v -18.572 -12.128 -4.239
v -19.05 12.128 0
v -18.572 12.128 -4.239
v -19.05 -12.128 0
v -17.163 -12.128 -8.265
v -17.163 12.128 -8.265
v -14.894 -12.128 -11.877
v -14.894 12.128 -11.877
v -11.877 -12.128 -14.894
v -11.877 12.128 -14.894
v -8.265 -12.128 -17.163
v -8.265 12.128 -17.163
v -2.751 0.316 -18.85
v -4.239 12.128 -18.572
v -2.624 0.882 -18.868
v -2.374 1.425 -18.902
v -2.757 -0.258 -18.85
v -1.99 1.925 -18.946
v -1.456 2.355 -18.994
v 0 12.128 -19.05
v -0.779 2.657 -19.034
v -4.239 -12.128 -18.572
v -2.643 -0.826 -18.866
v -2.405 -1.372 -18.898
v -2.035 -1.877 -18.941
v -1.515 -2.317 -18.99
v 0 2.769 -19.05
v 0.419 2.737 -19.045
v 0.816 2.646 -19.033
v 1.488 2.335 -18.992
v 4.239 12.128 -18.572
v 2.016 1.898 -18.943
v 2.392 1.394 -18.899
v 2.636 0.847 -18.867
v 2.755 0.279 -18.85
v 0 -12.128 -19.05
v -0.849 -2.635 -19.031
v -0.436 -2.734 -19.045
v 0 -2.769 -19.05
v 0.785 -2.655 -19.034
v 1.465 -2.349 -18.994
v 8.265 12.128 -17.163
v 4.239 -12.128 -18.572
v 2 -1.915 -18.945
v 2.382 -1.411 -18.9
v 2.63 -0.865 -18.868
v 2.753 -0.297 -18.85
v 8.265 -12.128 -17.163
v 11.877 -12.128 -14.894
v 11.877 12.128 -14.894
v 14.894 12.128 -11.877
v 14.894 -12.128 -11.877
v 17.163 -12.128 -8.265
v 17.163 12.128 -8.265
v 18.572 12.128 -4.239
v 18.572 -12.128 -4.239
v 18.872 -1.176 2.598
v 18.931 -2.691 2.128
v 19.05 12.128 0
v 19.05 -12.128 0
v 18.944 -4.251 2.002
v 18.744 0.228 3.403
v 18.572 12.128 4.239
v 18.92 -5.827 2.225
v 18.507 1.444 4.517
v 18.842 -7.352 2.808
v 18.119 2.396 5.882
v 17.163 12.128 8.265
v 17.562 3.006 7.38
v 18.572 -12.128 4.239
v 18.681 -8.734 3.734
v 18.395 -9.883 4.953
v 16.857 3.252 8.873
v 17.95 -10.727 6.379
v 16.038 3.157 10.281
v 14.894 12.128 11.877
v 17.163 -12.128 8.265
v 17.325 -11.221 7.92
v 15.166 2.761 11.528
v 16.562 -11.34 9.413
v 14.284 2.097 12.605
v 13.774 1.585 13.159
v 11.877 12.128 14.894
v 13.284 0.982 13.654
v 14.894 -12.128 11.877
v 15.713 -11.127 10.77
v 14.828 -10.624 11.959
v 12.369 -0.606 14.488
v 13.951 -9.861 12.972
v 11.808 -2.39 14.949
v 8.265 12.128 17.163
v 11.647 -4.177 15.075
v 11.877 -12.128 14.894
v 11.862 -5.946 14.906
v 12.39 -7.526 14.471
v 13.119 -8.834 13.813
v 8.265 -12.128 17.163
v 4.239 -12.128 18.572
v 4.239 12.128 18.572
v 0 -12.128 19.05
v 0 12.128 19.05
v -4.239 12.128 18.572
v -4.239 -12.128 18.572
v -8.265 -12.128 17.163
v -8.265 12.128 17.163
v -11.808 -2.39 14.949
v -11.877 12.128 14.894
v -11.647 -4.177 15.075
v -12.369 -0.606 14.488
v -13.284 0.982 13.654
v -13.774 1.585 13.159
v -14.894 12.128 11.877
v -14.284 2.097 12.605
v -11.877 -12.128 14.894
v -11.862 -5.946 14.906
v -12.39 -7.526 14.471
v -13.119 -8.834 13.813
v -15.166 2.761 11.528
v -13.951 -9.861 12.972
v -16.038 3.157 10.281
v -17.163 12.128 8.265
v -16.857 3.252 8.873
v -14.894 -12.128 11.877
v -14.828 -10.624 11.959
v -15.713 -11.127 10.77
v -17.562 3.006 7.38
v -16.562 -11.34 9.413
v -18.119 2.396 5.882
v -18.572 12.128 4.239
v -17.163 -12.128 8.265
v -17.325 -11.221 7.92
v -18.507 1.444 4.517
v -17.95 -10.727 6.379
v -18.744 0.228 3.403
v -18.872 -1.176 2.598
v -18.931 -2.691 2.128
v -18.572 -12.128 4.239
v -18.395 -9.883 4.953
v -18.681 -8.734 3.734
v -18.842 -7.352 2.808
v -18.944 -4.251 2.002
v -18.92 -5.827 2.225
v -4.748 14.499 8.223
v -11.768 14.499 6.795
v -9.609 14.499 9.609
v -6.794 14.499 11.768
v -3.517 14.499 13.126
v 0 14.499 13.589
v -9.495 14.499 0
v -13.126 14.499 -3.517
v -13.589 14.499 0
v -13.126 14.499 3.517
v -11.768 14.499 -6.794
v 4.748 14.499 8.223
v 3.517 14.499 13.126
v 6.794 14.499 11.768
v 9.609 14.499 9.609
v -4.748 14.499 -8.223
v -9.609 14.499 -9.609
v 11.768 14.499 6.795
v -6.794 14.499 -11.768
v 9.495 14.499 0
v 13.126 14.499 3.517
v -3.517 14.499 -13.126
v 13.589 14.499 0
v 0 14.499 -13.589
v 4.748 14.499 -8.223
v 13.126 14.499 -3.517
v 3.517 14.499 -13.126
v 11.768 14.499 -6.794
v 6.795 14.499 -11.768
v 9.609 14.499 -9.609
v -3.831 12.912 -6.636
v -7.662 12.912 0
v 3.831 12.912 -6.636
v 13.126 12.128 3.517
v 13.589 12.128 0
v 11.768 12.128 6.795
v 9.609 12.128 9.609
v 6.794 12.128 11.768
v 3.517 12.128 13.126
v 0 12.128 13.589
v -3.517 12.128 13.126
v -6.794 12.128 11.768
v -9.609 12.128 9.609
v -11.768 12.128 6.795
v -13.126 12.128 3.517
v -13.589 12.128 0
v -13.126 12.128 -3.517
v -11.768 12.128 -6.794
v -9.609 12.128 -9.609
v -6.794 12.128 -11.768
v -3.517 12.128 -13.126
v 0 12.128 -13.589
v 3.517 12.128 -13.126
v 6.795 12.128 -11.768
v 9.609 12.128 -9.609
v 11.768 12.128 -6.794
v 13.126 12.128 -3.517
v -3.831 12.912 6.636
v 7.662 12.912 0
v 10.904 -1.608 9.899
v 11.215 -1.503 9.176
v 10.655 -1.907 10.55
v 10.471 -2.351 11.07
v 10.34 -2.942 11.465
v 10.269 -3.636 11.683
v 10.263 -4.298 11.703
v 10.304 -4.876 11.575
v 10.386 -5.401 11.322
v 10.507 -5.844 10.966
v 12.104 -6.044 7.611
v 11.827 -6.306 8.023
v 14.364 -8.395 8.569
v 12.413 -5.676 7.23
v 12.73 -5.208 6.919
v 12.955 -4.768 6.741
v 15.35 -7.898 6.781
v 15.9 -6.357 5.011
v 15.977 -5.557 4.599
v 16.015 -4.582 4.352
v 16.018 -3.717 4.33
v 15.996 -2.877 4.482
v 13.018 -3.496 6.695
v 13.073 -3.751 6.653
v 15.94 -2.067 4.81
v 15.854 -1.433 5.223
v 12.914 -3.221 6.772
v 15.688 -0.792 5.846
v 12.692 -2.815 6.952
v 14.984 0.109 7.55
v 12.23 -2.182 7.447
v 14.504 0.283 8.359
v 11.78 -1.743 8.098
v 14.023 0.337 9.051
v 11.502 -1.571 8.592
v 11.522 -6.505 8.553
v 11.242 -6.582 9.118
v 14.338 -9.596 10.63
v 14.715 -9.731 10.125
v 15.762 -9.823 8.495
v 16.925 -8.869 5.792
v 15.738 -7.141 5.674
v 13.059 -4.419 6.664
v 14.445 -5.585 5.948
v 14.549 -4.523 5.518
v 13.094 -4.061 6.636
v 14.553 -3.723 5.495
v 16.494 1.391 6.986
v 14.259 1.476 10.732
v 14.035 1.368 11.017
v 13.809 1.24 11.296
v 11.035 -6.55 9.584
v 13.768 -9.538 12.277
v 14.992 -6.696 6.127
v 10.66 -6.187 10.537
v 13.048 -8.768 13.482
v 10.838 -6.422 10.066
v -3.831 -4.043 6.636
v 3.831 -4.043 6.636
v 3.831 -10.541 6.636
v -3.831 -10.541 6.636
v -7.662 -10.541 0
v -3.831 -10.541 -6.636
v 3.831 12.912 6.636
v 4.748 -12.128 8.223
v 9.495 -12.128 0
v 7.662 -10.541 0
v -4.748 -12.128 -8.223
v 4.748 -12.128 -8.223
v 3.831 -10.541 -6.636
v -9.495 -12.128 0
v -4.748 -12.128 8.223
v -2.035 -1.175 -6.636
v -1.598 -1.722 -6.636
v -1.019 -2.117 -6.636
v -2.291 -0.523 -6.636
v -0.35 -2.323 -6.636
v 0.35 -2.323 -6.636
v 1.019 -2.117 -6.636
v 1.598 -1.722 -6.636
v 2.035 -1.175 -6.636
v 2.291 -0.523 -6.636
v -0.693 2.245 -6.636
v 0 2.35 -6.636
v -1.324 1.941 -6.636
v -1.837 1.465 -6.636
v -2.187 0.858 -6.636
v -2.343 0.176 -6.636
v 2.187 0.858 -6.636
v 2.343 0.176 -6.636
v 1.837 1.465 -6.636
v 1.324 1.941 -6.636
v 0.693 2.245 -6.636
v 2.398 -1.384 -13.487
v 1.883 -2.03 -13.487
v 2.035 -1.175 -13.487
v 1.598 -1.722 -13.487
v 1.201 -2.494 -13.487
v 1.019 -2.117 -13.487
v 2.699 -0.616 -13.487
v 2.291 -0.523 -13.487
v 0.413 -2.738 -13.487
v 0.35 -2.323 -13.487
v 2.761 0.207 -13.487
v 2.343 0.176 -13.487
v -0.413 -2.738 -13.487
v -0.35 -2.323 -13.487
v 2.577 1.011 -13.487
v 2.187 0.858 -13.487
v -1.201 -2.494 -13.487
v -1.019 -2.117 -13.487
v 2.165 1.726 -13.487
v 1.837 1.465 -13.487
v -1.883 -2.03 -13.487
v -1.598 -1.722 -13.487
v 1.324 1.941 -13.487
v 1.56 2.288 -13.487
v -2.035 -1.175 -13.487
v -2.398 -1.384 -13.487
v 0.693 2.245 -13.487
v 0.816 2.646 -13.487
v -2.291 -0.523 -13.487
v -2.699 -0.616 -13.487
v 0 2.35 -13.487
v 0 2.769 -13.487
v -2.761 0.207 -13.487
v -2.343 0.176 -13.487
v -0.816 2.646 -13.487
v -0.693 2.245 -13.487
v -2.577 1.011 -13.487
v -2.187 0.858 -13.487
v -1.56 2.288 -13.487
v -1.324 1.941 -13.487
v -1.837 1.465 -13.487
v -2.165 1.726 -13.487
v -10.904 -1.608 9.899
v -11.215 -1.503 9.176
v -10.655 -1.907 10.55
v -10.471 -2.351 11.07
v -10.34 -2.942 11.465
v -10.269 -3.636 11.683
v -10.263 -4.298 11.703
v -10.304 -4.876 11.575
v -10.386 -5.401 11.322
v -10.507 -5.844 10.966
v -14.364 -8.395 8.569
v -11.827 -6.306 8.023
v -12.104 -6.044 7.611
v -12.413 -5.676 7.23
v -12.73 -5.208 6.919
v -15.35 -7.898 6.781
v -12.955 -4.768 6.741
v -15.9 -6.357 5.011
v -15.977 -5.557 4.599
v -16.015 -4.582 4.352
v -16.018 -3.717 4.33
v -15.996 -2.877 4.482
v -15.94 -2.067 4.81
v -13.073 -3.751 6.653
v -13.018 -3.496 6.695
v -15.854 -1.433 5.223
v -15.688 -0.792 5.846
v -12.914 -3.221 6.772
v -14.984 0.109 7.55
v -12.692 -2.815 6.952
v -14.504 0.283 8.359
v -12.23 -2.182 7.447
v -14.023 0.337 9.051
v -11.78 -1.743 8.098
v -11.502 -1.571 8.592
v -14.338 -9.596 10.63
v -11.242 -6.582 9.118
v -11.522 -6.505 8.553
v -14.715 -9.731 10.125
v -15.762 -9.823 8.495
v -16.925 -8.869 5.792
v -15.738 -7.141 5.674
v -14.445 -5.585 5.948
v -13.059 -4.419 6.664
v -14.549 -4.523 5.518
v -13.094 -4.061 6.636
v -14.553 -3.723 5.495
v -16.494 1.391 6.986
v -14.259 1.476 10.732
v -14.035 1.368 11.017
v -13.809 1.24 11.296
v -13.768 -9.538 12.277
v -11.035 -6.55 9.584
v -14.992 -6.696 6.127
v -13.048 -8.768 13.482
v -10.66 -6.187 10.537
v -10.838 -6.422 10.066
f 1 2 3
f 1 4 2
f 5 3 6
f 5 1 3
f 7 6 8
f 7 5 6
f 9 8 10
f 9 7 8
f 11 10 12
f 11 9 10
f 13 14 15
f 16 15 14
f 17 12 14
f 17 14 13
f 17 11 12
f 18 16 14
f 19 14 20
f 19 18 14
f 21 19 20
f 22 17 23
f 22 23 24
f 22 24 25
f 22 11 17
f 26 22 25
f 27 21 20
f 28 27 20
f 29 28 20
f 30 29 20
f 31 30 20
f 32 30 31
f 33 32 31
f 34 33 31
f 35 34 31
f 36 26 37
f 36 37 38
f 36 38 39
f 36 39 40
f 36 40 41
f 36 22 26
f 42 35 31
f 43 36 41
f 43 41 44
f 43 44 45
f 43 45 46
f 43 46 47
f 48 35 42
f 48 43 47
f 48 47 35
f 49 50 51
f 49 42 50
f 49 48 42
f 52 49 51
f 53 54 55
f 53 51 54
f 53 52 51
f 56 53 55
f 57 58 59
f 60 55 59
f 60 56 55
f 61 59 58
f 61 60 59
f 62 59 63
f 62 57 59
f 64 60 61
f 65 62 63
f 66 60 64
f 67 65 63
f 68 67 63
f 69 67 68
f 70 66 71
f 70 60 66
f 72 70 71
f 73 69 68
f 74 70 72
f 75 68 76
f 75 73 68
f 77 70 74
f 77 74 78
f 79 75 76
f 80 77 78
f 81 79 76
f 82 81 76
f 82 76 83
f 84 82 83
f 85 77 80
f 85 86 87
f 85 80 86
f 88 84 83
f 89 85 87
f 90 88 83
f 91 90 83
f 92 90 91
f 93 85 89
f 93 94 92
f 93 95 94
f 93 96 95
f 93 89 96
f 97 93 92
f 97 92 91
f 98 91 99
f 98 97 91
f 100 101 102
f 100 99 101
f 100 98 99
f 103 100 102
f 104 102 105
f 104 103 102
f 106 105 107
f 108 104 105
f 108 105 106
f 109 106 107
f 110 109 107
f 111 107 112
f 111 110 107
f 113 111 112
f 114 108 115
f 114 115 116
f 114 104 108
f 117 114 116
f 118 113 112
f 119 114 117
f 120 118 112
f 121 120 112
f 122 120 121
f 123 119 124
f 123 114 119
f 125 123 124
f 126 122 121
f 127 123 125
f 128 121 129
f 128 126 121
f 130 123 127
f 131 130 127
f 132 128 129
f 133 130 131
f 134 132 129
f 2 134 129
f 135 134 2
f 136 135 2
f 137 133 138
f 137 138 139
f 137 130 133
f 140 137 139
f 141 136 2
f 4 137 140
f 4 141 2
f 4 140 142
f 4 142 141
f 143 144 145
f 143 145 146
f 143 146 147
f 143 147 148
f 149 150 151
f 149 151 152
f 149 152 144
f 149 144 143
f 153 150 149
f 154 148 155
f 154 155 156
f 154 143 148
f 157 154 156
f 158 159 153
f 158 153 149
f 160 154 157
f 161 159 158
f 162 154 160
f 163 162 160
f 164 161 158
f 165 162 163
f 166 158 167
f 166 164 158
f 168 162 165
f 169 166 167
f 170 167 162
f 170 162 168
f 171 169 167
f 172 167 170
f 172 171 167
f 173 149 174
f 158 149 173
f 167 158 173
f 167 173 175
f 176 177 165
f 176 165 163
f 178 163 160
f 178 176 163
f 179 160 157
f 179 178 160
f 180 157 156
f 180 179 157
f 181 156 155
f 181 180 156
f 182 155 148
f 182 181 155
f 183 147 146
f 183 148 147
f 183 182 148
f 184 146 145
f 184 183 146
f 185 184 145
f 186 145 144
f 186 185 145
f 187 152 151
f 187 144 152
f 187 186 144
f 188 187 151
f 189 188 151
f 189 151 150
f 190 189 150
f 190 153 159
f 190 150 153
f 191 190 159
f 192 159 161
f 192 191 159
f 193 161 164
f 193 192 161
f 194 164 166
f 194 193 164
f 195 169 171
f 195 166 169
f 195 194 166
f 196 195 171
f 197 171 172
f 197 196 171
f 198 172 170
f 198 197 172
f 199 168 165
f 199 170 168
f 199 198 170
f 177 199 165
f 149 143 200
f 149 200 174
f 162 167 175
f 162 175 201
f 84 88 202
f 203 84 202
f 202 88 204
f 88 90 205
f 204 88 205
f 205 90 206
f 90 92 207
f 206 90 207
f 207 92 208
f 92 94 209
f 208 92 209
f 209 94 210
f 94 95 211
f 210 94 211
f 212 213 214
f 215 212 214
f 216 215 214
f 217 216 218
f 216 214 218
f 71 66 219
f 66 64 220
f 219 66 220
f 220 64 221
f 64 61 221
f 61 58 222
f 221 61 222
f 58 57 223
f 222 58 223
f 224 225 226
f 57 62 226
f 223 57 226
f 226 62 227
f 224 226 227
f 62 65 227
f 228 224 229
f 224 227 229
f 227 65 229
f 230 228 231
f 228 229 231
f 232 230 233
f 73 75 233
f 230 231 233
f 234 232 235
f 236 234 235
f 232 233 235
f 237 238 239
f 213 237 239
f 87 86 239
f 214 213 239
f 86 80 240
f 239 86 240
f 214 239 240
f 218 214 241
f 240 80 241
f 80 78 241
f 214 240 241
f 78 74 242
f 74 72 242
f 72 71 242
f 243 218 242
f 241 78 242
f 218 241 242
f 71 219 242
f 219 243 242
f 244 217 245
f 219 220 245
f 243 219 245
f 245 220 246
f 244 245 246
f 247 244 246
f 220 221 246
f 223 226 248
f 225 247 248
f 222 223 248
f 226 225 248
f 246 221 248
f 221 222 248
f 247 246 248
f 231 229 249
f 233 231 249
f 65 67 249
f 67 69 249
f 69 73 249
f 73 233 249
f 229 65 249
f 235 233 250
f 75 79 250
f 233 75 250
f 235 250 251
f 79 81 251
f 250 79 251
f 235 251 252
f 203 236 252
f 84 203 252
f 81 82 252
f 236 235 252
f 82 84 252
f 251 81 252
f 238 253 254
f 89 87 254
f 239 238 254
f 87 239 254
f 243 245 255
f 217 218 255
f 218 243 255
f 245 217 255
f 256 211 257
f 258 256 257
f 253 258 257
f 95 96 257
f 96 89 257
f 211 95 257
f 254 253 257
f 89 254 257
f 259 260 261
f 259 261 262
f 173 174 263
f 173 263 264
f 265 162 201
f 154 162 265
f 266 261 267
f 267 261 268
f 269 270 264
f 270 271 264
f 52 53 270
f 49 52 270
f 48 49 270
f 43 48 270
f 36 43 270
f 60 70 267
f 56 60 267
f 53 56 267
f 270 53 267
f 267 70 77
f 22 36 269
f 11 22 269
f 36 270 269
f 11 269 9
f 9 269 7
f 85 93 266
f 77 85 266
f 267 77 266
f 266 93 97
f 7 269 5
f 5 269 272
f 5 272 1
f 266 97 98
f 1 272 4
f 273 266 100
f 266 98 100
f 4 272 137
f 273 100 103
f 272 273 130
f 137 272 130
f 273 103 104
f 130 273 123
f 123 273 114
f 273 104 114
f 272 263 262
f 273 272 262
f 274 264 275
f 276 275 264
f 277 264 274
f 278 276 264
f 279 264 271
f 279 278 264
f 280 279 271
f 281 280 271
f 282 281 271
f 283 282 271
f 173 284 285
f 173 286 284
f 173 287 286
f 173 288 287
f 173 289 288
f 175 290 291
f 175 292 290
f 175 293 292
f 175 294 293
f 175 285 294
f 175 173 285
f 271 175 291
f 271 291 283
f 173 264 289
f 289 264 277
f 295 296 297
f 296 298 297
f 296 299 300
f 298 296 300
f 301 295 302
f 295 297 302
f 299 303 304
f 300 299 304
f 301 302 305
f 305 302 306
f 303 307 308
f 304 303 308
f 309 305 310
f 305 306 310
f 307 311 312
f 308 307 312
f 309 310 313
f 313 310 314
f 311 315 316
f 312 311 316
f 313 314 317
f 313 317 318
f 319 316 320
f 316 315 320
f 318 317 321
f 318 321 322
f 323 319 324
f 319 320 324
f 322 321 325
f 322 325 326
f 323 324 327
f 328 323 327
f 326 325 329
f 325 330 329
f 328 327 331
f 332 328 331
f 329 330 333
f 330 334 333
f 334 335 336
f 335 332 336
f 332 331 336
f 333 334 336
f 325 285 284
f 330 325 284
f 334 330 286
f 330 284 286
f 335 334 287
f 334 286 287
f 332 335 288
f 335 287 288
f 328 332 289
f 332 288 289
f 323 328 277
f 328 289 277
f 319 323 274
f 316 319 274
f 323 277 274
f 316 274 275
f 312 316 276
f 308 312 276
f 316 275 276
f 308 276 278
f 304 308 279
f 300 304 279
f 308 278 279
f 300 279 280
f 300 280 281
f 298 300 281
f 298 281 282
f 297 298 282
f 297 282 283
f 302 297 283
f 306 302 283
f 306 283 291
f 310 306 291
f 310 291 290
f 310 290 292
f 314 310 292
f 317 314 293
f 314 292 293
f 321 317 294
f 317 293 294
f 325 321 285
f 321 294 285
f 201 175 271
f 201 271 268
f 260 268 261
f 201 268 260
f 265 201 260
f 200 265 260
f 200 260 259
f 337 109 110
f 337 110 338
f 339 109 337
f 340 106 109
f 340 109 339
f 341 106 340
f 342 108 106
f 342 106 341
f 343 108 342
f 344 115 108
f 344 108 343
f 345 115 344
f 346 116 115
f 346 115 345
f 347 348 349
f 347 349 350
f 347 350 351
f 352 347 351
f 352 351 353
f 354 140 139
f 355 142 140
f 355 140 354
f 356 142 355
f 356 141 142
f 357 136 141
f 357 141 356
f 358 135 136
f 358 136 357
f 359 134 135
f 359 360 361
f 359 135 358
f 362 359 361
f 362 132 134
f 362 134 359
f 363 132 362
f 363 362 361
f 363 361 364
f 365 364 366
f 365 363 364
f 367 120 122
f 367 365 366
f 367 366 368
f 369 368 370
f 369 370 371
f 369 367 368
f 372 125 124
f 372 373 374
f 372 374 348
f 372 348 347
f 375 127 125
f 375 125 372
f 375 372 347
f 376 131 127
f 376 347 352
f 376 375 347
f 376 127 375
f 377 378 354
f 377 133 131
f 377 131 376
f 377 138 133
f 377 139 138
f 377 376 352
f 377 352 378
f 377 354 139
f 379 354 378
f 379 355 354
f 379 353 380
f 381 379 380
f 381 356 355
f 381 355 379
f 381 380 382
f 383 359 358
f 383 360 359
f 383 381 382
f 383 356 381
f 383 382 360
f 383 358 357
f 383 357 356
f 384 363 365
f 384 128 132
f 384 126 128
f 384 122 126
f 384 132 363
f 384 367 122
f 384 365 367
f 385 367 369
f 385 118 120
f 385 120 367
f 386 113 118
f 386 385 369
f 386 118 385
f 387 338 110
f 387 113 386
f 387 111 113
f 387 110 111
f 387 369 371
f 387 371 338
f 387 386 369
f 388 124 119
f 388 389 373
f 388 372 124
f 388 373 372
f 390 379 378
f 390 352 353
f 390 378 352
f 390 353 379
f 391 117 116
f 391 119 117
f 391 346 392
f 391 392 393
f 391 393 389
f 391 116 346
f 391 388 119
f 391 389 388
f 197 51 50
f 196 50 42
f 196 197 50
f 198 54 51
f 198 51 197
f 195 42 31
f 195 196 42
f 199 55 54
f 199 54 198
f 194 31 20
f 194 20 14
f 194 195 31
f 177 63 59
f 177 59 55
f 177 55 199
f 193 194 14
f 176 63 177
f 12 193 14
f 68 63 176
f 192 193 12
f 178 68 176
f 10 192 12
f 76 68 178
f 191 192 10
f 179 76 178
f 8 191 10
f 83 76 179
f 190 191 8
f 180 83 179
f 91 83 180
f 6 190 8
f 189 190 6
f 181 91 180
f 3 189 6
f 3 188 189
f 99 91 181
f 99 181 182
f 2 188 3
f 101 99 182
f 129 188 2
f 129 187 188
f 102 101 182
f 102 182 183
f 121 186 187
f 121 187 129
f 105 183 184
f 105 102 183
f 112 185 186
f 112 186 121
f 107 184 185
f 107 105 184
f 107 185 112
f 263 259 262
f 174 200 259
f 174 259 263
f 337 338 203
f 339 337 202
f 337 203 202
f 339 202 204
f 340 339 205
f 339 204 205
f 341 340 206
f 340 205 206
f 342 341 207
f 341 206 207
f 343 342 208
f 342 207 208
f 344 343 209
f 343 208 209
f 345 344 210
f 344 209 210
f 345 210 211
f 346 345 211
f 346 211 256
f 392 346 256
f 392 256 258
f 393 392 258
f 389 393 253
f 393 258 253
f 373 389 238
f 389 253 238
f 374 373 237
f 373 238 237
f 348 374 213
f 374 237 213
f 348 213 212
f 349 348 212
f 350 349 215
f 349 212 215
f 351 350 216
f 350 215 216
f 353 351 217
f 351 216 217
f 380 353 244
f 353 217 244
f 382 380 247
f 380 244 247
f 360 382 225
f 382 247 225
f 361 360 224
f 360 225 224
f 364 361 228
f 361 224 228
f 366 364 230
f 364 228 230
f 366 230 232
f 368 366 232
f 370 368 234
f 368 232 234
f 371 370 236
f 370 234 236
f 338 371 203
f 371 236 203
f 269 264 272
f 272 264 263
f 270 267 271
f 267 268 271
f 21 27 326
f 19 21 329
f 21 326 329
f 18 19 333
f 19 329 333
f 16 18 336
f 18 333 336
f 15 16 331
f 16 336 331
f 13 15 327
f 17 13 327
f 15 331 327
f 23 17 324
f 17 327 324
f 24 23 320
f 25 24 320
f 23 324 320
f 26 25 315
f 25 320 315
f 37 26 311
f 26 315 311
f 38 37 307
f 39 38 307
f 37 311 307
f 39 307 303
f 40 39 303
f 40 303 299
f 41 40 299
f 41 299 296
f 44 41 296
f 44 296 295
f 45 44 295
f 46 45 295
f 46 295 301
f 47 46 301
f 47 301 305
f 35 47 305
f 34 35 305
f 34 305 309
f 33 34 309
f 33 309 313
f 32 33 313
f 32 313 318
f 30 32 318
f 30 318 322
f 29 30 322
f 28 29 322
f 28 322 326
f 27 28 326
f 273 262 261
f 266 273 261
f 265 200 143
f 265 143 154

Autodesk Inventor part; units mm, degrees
ref_plane "YZ Plane" through (0, 0, 0) normal (1, 0, 0) x (0, 1, 0)
ref_plane "XZ Plane" through (0, 0, 0) normal (0, 1, 0) x (-1, 0, 0)
sketch "Sketch9" plane through (0, 0, 0) normal (0, 1, 0) x (-1, 0, 0)
  circle A0 centre (0, 0) radius 19.05
  dimension "d53" = 38.1
extrude "Extrusion6" add sketch "Sketch9" along normal mid plane 24.257
sketch "Sketch10" plane through (0, 12.1285, 0) normal (0, 1, 0) x (1, 0, 0)
  circle A0 centre (0, 0) radius 13.589
  dimension "idWasher" = 27.178
extrude "Extrusion7" add sketch "Sketch10" along normal blind 2.3707
sketch "Sketch11" plane through (0, 14.4992, 0) normal (0, 1, 0) x (1, 0, 0)
  line L0 (7.6623, 0) -> (3.8312, -6.6358)
  line L1 (3.8312, -6.6358) -> (-3.8312, -6.6358)
  line L2 (-3.8312, -6.6358) -> (-7.6623, 0)
  line L3 (-7.6623, 0) -> (-3.8312, 6.6357)
  line L4 (-3.8312, 6.6357) -> (3.8312, 6.6357)
  line L5 (3.8312, 6.6357) -> (7.6623, 0)
  point P0 (0, 0)
  point P1 (0, 0)
  dimension "d59" = 13.2715
extrude "Extrusion8" cut sketch "Sketch11" against normal through all
sketch "Sketch12" plane through (0, 0, 0) normal (1, 0, 0) x (0, 1, 0)
  circle A0 centre (-4.0428, 9.1758) radius 2.54
  line L0 (14.4992, 0) -> (-12.1285, 0) projected
  line L1 (-12.1285, 19.05) -> (-12.1285, -19.05) projected
  point P0 (0, 0)
  dimension "d62" = 5.08
  dimension "d63" = 9.1758
  dimension "oneThirdSpoolHeight" = 8.0857
extrude "Extrusion9" cut sketch "Sketch12" along normal through all both and the other way through all
chamfer "Chamfer5" distance 4.7625 angle 45 2 edges at (16.6229, -6.5796, 9.3048) (-16.6229, -6.5796, 9.3048)
ref_plane "Work Plane2" through (0, 0, -19.05) normal (0, 0, 1) x (1, 0, 0)
sketch "Sketch13" plane through (0, 0, -19.05) normal (0, 0, 1) x (1, 0, 0)
  point P0 (0, 0)
  point P1 (0, 0)
hole "Hole2" at (0, 0, -19.05) direction (0, 0, 1) diameter 4.699 depth 12.4143 counterbore diameter 5.5372 counterbore depth 5.5626
chamfer "Chamfer6" distance 1.5875 angle 45 12 edges at (-5.7467, 14.4992, -3.3179) (0, 14.4992, -6.6357) (5.7467, 14.4992, -3.3179) (5.7467, 14.4992, 3.3179) (0, 14.4992, 6.6358) (-5.7467, 14.4992, 3.3179) (0, -12.1285, 6.6358) (5.7467, -12.1285, 3.3179) (5.7467, -12.1285, -3.3179) (0, -12.1285, -6.6357) (-5.7467, -12.1285, -3.3179) (-5.7467, -12.1285, 3.3179)
equation "\"d53\" = spoolInteriorDiameter"
equation "\"d59\" = hexDiameter"
equation "\"d62\" = holeForString"
equation "\"d63\" = stringHoleCenterFromHexShaft"
equation "\"oneThirdSpoolHeight\" = 0.333333 * singleSpoolHeight"
equation "\"d67\" = stringHoleChamfer"
equation "\"d77\" = hexHoleChamfer"
equation "\"holeForString\" = stringDiameter + clearanceForString"
equation "\"stringDiameter\" = 3.048"
equation "\"clearanceForString\" = 2.032"
equation "\"spoolHeightWithoutSpacer\" = 69.85"
equation "\"hexShaftDiameter\" = 12.7"
equation "\"clearanceForHexShaft\" = 0.5715"
equation "\"hexDiameter\" = hexShaftDiameter + clearanceForHexShaft"
equation "\"supportChannels\" = 3.81"
equation "\"spoolInteriorDiameter\" = 38.1"
equation "\"spoolInteriroRadius\" = 0.5 * spoolInteriorDiameter"
equation "\"spoolExteriorDiameter\" = 88.9"
equation "\"spoolExteriorRadius\" = 0.5 * spoolExteriorDiameter"
equation "\"spoolFiletRadius\" = 0.5 * supportChannels"
equation "\"holeCenter\" = 0.25 * spoolHeightWithoutSpacer - 0.75 * supportChannels"
equation "\"hexHoleChamfer\" = 1.5875"
equation "\"stringHoleCenterFromHexShaft\" = 0.5 * hexDiameter + 0.5 * holeForString"
equation "\"textCircleDiameter\" = 0.75 * spoolExteriorDiameter"
equation "\"textHeight\" = 6.096"
equation "\"textDepth\" = 1.27"
equation "\"stringHoleChamfer\" = 4.7625"
equation "\"spoolTotalHeight\" = 76.2"
equation "\"spaceHeight\" = spoolTotalHeight - spoolHeightWithoutSpacer"
equation "\"spacerDiameter\" = 24.13"
equation "\"singleSpoolHeight\" = 24.257"
properties part number "spoolV04" material "PC/ABS Plastic"
